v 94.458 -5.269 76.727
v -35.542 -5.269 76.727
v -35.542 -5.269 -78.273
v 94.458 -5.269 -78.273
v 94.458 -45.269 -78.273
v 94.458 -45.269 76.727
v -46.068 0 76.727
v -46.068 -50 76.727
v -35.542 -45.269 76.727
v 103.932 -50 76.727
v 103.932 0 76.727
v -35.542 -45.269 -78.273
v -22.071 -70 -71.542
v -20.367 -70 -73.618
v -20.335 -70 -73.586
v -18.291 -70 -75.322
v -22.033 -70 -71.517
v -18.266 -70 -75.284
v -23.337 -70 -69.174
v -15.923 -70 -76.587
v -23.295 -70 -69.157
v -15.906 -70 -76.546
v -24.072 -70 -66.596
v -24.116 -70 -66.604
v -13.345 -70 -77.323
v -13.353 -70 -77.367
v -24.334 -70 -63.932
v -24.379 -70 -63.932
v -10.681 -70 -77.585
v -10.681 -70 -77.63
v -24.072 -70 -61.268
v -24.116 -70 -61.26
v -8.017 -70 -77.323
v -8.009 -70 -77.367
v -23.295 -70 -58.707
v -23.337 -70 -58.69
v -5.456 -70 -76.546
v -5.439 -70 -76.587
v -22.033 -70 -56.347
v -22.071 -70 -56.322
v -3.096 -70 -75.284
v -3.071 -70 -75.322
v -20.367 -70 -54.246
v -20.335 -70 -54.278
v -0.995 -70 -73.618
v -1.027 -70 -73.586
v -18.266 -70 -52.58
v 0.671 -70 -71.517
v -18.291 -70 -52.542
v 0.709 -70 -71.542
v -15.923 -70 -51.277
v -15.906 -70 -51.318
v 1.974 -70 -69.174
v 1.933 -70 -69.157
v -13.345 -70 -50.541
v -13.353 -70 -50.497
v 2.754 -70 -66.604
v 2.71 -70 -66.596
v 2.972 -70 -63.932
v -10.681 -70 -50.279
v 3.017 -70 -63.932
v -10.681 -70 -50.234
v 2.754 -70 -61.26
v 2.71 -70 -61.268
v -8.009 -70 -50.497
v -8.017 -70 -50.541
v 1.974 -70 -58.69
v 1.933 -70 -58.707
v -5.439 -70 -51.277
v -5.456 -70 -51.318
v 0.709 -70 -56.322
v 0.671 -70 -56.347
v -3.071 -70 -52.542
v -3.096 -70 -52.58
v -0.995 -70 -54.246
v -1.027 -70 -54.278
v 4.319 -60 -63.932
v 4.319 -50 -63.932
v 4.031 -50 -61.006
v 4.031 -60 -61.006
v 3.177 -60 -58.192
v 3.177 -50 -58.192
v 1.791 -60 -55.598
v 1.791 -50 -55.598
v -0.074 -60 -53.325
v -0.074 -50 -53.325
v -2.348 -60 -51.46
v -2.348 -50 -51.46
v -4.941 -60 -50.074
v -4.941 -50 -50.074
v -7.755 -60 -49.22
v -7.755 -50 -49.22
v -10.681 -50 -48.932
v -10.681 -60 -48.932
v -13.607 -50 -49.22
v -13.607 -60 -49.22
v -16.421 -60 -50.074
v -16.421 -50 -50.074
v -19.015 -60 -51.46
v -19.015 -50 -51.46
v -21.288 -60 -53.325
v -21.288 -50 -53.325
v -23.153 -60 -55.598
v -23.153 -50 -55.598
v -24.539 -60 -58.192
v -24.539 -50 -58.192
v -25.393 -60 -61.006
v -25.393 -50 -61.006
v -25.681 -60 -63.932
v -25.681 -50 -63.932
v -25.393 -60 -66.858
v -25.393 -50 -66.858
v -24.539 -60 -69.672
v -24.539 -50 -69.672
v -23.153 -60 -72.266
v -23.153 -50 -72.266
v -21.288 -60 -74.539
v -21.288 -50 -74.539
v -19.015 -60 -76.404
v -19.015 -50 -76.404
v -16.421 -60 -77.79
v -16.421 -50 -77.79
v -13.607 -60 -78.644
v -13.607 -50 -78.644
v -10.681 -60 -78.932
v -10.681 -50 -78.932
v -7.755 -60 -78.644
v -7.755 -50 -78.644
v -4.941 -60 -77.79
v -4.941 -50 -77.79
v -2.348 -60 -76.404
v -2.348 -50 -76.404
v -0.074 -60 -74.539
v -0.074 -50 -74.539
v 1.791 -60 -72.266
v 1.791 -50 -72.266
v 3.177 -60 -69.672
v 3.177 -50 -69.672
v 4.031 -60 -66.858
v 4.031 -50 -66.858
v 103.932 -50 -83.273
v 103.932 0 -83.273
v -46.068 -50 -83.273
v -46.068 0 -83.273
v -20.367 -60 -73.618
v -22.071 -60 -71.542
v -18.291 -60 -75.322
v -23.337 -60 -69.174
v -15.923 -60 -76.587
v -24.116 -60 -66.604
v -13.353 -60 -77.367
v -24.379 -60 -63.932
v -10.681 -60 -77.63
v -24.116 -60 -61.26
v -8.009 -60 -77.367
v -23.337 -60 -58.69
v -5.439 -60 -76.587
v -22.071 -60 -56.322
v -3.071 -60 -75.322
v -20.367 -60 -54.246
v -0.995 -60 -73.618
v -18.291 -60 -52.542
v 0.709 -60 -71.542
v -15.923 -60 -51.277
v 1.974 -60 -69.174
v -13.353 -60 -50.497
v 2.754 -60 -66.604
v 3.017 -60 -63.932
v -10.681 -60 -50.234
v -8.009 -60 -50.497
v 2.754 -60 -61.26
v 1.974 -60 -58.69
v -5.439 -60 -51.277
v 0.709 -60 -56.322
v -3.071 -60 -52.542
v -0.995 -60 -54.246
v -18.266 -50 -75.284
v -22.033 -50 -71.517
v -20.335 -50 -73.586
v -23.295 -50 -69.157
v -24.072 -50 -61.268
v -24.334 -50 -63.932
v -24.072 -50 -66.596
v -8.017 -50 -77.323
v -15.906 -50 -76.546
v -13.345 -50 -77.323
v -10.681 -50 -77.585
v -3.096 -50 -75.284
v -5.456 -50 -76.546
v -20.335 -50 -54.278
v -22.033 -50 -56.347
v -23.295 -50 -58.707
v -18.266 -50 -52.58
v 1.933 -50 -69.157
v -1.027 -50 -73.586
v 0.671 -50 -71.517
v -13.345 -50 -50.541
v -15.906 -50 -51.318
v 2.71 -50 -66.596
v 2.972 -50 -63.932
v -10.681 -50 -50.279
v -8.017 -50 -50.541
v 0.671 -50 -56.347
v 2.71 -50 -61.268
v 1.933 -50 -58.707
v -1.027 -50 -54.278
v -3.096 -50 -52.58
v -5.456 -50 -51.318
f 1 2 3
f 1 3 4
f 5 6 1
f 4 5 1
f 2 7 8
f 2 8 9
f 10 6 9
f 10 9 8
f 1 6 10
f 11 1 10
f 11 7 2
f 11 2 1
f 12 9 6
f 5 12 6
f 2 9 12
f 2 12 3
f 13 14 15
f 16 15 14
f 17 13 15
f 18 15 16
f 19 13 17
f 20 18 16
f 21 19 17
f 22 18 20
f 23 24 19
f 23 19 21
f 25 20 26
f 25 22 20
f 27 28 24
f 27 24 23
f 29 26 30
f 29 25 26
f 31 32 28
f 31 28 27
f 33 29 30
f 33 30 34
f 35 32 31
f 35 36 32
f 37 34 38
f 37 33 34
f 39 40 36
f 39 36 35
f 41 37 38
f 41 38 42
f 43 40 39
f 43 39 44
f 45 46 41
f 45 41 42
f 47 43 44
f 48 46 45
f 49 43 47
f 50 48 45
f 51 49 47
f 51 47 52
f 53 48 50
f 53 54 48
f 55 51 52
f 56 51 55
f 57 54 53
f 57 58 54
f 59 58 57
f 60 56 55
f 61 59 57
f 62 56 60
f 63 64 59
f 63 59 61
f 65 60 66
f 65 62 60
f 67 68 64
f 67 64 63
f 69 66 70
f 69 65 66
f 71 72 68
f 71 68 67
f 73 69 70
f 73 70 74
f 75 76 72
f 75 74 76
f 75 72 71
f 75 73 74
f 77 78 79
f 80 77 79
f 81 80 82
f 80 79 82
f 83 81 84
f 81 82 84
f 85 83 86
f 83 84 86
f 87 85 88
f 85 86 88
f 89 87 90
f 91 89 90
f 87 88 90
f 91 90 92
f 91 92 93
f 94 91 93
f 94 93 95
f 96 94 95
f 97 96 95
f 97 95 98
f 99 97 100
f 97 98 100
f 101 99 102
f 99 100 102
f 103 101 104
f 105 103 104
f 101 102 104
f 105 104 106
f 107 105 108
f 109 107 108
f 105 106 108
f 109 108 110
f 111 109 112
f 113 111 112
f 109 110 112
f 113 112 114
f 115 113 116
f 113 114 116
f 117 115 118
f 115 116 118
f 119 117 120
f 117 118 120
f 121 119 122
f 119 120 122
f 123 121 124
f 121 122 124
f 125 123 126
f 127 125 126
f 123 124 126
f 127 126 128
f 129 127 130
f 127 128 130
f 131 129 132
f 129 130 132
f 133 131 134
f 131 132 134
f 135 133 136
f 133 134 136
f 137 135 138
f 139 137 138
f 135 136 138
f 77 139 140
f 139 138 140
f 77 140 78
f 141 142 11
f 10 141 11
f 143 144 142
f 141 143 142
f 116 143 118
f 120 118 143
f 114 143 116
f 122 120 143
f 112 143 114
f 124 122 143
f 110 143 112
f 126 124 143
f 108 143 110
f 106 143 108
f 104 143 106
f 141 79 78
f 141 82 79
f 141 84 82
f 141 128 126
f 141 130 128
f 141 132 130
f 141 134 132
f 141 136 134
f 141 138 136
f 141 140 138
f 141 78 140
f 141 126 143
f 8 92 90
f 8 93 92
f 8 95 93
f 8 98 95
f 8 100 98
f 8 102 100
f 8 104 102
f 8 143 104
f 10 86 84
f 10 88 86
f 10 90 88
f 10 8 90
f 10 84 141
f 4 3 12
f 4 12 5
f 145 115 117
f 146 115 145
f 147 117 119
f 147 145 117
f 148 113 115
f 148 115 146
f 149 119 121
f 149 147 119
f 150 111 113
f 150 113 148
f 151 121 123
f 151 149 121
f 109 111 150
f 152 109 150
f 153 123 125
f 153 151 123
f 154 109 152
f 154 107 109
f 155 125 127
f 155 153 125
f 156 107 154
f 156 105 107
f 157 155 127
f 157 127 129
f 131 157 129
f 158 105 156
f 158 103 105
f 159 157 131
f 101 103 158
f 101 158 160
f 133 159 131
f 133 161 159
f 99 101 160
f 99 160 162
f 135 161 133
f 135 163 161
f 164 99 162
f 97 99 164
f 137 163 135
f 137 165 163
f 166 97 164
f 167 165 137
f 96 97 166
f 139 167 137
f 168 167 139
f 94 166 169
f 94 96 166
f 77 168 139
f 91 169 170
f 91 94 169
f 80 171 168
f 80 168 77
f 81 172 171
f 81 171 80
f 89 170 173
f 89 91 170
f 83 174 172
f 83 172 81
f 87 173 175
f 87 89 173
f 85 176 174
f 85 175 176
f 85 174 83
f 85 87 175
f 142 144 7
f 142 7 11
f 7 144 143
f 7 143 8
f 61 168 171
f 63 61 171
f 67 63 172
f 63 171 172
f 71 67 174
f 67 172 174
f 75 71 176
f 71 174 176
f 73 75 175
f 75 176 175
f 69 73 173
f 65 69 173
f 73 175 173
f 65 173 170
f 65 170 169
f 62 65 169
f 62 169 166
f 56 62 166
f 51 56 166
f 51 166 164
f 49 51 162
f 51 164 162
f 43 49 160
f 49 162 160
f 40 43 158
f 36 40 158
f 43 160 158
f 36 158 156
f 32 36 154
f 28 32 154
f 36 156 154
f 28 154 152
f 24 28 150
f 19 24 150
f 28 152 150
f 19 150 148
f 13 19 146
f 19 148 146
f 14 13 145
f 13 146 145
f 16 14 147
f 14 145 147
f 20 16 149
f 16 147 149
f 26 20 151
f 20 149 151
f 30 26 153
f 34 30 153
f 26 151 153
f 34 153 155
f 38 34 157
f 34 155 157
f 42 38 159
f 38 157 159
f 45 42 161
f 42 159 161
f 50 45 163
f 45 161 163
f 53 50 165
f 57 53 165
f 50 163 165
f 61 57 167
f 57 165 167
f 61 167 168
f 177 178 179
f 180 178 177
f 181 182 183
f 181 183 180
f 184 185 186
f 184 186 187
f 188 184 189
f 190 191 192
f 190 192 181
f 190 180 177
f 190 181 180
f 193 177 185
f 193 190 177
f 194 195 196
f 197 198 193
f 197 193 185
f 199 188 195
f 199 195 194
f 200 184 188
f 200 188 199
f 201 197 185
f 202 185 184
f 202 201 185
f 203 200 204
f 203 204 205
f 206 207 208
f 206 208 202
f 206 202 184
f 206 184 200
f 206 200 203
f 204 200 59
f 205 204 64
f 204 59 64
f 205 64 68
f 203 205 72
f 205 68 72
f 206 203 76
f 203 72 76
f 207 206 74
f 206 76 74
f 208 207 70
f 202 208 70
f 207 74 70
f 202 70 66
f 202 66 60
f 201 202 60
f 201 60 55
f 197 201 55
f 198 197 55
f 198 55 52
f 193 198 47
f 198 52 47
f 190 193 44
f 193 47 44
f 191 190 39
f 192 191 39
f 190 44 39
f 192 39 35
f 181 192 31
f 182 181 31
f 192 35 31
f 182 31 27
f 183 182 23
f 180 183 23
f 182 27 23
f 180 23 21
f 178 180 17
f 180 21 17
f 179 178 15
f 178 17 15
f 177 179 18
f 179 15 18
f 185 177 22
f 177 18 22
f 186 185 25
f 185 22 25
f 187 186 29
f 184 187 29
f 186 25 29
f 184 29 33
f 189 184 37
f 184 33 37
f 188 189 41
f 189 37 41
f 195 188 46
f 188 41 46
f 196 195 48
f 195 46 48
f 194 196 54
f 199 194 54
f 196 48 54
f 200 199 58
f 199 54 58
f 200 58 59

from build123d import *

# Parameters (mm, degrees)
F0_W     = 150
F0_H     = 160
F1_DEPTH = 50
F2_W     = 130
F2_H     = 40
F3_DEPTH = 155
F4_R     = 15
F5_DEPTH = 10
F6_R     = 13.698165
F7_DEPTH = 10
F8_R     = 13.6531
F9_DEPTH = 20


with BuildPart() as f1:
    # F0 (on Front) → F1 (new body)
    with BuildSketch(Plane.XZ):
        with Locations((28.931955, -3.273388)):
            Rectangle(F0_W, F0_H)
    extrude(amount=F1_DEPTH)

    # F2 (on face) → F3 (cut)
    with BuildSketch(Plane.XY.offset(76.726612)):
        with Locations((29.457796, -25.269221)):
            Rectangle(F2_W, F2_H)
    extrude(amount=-F3_DEPTH, mode=Mode.SUBTRACT)

    # F4 (on face) → F5 (join)
    with BuildSketch(Plane.XZ.offset(50)):
        with Locations((-10.681064, -63.932007)):
            Circle(F4_R)
    extrude(amount=F5_DEPTH)

    # F6 (on face) → F7 (join)
    with BuildSketch(Plane.XZ.offset(60)):
        with Locations((-10.681064, -63.932007)):
            Circle(F6_R)
    extrude(amount=F7_DEPTH)

    # F8 (on face) → F9 (cut)
    with BuildSketch(Plane.XZ.offset(70)):
        with Locations((-10.681064, -63.932007)):
            Circle(F8_R)
    extrude(amount=-F9_DEPTH, mode=Mode.SUBTRACT)


solid = f1.part
